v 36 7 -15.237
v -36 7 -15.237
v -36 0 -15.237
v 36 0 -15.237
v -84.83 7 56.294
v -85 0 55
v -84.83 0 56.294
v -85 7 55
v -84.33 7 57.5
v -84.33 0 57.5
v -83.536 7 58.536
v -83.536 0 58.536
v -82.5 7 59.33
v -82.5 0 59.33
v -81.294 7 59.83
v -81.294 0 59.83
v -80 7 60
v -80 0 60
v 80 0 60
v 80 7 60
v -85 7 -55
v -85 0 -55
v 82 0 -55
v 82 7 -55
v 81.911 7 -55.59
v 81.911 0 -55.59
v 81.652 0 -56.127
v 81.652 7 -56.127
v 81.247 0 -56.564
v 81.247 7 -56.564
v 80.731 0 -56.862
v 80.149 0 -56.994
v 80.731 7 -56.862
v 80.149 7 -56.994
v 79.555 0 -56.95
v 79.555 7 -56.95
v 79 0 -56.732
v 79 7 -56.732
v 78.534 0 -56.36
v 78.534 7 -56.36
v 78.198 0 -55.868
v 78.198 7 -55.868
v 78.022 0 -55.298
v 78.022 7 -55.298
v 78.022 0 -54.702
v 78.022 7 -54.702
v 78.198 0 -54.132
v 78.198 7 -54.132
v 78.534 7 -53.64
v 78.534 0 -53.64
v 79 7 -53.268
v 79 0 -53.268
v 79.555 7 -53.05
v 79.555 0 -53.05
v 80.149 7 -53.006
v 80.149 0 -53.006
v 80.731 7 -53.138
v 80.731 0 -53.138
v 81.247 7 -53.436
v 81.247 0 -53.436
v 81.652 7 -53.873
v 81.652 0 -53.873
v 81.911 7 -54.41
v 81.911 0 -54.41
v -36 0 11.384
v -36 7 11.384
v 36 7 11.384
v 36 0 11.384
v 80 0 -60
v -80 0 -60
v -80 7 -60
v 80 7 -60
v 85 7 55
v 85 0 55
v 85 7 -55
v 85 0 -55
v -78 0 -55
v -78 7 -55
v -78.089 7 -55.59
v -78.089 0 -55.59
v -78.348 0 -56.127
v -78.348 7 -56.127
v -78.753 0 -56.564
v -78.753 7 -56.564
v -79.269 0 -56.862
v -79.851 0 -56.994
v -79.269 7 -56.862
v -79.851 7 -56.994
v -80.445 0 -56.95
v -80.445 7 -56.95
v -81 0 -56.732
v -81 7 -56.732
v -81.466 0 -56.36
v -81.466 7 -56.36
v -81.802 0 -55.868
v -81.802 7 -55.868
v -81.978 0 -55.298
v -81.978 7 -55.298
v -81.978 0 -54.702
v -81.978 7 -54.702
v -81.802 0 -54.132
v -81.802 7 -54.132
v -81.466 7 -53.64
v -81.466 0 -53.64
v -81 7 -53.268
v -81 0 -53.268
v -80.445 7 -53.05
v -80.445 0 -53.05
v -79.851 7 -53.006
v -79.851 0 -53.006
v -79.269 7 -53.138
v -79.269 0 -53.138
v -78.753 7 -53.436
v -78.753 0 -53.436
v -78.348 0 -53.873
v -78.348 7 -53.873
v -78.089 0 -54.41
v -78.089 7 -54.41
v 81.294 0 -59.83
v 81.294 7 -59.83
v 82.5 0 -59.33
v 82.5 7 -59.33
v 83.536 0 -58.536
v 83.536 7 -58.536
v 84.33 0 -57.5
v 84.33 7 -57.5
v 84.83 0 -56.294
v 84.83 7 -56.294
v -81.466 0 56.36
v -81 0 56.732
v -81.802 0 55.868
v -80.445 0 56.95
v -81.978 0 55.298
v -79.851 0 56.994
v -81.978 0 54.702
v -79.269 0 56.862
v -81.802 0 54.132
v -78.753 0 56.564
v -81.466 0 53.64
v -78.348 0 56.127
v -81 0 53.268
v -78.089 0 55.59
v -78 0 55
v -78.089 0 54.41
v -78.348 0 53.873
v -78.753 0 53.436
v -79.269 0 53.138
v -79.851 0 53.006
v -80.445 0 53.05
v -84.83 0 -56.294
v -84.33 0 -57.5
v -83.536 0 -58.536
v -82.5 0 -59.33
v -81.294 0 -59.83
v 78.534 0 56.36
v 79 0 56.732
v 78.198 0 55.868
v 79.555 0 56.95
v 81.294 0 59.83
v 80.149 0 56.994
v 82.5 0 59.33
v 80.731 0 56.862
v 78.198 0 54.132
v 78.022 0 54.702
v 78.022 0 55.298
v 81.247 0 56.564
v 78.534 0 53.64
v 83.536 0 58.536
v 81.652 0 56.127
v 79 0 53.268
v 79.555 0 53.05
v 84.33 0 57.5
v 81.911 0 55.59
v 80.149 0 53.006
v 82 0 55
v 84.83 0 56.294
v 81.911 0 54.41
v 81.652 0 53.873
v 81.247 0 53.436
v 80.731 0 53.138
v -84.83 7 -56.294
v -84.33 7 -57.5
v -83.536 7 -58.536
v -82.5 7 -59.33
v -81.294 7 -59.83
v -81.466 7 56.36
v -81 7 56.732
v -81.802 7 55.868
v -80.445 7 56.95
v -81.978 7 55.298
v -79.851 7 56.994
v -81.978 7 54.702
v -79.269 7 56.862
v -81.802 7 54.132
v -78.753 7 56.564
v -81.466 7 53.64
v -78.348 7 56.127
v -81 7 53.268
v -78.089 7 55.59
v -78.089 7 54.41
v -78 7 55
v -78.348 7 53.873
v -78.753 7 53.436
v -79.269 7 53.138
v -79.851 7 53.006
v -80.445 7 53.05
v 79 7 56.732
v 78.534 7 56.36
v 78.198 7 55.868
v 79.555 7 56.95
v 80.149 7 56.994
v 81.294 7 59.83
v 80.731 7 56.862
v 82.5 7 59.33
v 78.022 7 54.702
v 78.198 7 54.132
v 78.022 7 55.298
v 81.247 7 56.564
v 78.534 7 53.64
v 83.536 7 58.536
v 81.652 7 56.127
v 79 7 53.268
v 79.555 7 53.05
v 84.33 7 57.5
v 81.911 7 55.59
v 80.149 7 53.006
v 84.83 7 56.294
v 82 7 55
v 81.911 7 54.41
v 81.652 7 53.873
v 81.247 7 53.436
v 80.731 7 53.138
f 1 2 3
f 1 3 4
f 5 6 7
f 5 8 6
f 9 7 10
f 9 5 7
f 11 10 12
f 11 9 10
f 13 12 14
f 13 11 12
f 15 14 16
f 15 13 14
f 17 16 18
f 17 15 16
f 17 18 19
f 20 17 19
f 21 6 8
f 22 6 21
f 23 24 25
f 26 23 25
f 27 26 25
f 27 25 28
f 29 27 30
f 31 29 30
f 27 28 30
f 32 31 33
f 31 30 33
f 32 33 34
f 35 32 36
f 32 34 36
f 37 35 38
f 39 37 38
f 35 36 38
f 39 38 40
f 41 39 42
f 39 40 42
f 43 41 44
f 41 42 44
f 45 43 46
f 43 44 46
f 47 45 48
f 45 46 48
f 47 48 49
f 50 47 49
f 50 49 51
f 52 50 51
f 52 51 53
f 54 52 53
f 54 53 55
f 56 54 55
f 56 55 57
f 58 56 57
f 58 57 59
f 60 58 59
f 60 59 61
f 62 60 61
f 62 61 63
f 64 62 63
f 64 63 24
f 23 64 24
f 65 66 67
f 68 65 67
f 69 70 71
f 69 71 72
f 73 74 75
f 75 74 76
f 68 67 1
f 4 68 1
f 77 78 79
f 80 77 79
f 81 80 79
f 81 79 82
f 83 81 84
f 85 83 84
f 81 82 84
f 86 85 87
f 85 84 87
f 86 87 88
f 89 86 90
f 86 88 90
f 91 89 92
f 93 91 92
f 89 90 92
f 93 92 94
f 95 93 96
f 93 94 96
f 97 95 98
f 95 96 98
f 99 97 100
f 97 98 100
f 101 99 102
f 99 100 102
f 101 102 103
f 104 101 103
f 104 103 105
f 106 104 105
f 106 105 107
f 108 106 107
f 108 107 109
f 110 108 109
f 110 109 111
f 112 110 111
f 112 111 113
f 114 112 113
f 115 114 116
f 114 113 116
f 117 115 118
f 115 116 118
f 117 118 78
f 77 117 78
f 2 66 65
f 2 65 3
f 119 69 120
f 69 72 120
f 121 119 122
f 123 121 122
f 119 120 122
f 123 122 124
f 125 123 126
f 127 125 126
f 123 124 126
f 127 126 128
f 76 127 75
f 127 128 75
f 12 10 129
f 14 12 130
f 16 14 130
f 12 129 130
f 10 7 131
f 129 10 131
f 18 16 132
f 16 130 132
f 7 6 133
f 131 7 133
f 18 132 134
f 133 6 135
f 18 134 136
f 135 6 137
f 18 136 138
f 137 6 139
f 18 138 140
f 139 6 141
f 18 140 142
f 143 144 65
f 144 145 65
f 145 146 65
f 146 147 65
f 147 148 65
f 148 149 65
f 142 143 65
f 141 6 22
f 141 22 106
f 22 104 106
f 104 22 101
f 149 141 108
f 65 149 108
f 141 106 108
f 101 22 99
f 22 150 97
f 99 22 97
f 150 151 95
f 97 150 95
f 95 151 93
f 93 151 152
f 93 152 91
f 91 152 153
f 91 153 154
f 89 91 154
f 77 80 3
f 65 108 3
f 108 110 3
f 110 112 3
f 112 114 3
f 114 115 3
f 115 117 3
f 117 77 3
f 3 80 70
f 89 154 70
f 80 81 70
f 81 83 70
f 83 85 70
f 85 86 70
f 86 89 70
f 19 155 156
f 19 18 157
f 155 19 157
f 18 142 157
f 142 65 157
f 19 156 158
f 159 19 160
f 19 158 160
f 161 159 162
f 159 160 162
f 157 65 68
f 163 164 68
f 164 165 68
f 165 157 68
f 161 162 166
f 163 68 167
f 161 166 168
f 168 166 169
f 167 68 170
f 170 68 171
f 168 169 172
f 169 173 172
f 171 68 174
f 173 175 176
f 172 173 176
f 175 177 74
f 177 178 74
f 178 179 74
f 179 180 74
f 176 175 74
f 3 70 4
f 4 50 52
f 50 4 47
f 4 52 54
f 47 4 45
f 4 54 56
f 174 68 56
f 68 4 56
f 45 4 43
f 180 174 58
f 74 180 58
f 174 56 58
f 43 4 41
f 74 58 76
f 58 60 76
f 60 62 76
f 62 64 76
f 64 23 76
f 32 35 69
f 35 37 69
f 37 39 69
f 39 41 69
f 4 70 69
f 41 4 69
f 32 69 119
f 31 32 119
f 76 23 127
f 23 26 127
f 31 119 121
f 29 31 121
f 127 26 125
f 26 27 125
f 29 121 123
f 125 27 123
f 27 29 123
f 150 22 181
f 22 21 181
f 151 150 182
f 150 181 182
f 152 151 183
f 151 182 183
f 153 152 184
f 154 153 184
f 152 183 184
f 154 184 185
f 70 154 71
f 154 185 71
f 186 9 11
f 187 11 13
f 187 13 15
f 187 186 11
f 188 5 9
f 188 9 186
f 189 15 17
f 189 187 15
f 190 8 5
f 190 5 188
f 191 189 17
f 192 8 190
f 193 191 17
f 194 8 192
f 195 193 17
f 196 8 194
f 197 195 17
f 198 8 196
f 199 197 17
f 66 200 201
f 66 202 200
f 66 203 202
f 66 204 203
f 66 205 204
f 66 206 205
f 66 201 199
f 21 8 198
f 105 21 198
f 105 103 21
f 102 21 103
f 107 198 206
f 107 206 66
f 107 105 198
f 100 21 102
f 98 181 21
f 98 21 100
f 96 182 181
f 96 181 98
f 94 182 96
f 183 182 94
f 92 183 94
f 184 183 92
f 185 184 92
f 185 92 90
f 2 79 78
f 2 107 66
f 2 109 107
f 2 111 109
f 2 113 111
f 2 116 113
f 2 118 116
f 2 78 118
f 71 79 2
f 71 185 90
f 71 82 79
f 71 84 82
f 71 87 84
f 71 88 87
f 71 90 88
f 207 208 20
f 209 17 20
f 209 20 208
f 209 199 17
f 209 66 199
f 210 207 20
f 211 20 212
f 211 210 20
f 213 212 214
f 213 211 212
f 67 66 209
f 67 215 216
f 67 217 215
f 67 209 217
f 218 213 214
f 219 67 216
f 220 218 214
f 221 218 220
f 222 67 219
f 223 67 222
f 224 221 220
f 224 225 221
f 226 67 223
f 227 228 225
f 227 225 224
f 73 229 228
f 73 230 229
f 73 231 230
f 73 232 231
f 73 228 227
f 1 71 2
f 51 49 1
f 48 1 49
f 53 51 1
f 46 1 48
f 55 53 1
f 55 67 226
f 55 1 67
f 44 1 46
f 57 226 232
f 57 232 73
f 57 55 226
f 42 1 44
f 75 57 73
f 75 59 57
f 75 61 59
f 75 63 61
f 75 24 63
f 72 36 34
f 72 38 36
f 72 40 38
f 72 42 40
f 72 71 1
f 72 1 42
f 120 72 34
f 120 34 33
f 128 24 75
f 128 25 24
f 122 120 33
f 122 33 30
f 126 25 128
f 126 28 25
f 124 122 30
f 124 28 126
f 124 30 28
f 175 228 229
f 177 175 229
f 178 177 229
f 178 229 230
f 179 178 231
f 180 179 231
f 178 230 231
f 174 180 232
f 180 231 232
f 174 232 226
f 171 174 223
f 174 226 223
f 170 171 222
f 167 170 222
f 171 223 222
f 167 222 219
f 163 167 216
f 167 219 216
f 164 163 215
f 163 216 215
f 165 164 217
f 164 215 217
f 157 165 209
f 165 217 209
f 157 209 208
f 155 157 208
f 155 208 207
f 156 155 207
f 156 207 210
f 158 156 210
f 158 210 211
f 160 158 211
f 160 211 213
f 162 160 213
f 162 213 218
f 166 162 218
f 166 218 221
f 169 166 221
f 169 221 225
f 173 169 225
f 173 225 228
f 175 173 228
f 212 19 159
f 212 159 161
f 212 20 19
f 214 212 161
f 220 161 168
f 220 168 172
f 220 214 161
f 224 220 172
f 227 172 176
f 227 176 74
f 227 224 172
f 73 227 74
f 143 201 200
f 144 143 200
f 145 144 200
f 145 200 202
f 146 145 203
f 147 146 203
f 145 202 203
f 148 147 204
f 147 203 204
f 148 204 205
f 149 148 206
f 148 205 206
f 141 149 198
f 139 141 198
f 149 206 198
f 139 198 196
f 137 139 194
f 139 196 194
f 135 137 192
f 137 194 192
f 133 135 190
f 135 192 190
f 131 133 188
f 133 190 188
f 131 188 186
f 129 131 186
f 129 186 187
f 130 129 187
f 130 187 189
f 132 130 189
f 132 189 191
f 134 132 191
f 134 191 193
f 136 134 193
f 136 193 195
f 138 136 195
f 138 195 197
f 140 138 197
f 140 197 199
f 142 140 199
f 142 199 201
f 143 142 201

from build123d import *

# Parameters (mm, degrees)
SKETCH1_W           = 170
SKETCH1_H           = 120
BOSS_EXTRUDE1_DEPTH = 7
SKETCH2_W           = 72
SKETCH2_H           = 26.620567464
CUT_EXTRUDE1_DEPTH  = 7
SKETCH3_R           = 2
CUT_EXTRUDE5_DEPTH  = 7
SKETCH7_R           = 2
CUT_EXTRUDE7_DEPTH  = 10
SKETCH6_R           = 2
CUT_EXTRUDE10_DEPTH = 10
SKETCH9_R           = 2
CUT_EXTRUDE11_DEPTH = 10
FILLET1_R           = 5


with BuildPart() as part:
    # Sketch1 → Boss-Extrude1 (new body)
    with BuildSketch(Plane(origin=(0, 0, 0), x_dir=(1, 0, 0), z_dir=(0, 1, 0))):
        Rectangle(SKETCH1_W, SKETCH1_H)
    extrude(amount=BOSS_EXTRUDE1_DEPTH)

    # Sketch2 → Cut-Extrude1 (cut)
    with BuildSketch(Plane(origin=(0, 7, 0), x_dir=(1, 0, 0), z_dir=(0, 1, 0))):
        with Locations((0, 1.926488435)):
            Rectangle(SKETCH2_W, SKETCH2_H)
    extrude(amount=-CUT_EXTRUDE1_DEPTH, mode=Mode.SUBTRACT)

    # Sketch3 → Cut-Extrude5 (cut)
    with BuildSketch(Plane(origin=(0, 7, 0), x_dir=(1, 0, 0), z_dir=(0, 1, 0))):
        with Locations((-80, 55)):
            Circle(SKETCH3_R)
    extrude(amount=-CUT_EXTRUDE5_DEPTH, mode=Mode.SUBTRACT)

    # Sketch7 → Cut-Extrude7 (cut)
    with BuildSketch(Plane(origin=(0, 7, 0), x_dir=(1, 0, 0), z_dir=(0, 1, 0))):
        with Locations((-80, -55)):
            Circle(SKETCH7_R)
    extrude(amount=-CUT_EXTRUDE7_DEPTH, mode=Mode.SUBTRACT)

    # Sketch6 → Cut-Extrude10 (cut)
    with BuildSketch(Plane(origin=(0, 7, 0), x_dir=(1, 0, 0), z_dir=(0, 1, 0))):
        with Locations((80, 55)):
            Circle(SKETCH6_R)
    extrude(amount=-CUT_EXTRUDE10_DEPTH, mode=Mode.SUBTRACT)

    # Sketch9 → Cut-Extrude11 (cut)
    with BuildSketch(Plane(origin=(0, 7, 0), x_dir=(1, 0, 0), z_dir=(0, 1, 0))):
        with Locations((80, -55)):
            Circle(SKETCH9_R)
    extrude(amount=-CUT_EXTRUDE11_DEPTH, mode=Mode.SUBTRACT)

    # Fillet1
    fillet1_edges = [part.edges().sort_by_distance(p)[0] for p in [
        (-85, 3.5, -60),
        (85, 3.5, -60),
        (85, 3.5, 60),
        (-85, 3.5, 60),
    ]]
    fillet(fillet1_edges, radius=FILLET1_R)


solid = part.part
